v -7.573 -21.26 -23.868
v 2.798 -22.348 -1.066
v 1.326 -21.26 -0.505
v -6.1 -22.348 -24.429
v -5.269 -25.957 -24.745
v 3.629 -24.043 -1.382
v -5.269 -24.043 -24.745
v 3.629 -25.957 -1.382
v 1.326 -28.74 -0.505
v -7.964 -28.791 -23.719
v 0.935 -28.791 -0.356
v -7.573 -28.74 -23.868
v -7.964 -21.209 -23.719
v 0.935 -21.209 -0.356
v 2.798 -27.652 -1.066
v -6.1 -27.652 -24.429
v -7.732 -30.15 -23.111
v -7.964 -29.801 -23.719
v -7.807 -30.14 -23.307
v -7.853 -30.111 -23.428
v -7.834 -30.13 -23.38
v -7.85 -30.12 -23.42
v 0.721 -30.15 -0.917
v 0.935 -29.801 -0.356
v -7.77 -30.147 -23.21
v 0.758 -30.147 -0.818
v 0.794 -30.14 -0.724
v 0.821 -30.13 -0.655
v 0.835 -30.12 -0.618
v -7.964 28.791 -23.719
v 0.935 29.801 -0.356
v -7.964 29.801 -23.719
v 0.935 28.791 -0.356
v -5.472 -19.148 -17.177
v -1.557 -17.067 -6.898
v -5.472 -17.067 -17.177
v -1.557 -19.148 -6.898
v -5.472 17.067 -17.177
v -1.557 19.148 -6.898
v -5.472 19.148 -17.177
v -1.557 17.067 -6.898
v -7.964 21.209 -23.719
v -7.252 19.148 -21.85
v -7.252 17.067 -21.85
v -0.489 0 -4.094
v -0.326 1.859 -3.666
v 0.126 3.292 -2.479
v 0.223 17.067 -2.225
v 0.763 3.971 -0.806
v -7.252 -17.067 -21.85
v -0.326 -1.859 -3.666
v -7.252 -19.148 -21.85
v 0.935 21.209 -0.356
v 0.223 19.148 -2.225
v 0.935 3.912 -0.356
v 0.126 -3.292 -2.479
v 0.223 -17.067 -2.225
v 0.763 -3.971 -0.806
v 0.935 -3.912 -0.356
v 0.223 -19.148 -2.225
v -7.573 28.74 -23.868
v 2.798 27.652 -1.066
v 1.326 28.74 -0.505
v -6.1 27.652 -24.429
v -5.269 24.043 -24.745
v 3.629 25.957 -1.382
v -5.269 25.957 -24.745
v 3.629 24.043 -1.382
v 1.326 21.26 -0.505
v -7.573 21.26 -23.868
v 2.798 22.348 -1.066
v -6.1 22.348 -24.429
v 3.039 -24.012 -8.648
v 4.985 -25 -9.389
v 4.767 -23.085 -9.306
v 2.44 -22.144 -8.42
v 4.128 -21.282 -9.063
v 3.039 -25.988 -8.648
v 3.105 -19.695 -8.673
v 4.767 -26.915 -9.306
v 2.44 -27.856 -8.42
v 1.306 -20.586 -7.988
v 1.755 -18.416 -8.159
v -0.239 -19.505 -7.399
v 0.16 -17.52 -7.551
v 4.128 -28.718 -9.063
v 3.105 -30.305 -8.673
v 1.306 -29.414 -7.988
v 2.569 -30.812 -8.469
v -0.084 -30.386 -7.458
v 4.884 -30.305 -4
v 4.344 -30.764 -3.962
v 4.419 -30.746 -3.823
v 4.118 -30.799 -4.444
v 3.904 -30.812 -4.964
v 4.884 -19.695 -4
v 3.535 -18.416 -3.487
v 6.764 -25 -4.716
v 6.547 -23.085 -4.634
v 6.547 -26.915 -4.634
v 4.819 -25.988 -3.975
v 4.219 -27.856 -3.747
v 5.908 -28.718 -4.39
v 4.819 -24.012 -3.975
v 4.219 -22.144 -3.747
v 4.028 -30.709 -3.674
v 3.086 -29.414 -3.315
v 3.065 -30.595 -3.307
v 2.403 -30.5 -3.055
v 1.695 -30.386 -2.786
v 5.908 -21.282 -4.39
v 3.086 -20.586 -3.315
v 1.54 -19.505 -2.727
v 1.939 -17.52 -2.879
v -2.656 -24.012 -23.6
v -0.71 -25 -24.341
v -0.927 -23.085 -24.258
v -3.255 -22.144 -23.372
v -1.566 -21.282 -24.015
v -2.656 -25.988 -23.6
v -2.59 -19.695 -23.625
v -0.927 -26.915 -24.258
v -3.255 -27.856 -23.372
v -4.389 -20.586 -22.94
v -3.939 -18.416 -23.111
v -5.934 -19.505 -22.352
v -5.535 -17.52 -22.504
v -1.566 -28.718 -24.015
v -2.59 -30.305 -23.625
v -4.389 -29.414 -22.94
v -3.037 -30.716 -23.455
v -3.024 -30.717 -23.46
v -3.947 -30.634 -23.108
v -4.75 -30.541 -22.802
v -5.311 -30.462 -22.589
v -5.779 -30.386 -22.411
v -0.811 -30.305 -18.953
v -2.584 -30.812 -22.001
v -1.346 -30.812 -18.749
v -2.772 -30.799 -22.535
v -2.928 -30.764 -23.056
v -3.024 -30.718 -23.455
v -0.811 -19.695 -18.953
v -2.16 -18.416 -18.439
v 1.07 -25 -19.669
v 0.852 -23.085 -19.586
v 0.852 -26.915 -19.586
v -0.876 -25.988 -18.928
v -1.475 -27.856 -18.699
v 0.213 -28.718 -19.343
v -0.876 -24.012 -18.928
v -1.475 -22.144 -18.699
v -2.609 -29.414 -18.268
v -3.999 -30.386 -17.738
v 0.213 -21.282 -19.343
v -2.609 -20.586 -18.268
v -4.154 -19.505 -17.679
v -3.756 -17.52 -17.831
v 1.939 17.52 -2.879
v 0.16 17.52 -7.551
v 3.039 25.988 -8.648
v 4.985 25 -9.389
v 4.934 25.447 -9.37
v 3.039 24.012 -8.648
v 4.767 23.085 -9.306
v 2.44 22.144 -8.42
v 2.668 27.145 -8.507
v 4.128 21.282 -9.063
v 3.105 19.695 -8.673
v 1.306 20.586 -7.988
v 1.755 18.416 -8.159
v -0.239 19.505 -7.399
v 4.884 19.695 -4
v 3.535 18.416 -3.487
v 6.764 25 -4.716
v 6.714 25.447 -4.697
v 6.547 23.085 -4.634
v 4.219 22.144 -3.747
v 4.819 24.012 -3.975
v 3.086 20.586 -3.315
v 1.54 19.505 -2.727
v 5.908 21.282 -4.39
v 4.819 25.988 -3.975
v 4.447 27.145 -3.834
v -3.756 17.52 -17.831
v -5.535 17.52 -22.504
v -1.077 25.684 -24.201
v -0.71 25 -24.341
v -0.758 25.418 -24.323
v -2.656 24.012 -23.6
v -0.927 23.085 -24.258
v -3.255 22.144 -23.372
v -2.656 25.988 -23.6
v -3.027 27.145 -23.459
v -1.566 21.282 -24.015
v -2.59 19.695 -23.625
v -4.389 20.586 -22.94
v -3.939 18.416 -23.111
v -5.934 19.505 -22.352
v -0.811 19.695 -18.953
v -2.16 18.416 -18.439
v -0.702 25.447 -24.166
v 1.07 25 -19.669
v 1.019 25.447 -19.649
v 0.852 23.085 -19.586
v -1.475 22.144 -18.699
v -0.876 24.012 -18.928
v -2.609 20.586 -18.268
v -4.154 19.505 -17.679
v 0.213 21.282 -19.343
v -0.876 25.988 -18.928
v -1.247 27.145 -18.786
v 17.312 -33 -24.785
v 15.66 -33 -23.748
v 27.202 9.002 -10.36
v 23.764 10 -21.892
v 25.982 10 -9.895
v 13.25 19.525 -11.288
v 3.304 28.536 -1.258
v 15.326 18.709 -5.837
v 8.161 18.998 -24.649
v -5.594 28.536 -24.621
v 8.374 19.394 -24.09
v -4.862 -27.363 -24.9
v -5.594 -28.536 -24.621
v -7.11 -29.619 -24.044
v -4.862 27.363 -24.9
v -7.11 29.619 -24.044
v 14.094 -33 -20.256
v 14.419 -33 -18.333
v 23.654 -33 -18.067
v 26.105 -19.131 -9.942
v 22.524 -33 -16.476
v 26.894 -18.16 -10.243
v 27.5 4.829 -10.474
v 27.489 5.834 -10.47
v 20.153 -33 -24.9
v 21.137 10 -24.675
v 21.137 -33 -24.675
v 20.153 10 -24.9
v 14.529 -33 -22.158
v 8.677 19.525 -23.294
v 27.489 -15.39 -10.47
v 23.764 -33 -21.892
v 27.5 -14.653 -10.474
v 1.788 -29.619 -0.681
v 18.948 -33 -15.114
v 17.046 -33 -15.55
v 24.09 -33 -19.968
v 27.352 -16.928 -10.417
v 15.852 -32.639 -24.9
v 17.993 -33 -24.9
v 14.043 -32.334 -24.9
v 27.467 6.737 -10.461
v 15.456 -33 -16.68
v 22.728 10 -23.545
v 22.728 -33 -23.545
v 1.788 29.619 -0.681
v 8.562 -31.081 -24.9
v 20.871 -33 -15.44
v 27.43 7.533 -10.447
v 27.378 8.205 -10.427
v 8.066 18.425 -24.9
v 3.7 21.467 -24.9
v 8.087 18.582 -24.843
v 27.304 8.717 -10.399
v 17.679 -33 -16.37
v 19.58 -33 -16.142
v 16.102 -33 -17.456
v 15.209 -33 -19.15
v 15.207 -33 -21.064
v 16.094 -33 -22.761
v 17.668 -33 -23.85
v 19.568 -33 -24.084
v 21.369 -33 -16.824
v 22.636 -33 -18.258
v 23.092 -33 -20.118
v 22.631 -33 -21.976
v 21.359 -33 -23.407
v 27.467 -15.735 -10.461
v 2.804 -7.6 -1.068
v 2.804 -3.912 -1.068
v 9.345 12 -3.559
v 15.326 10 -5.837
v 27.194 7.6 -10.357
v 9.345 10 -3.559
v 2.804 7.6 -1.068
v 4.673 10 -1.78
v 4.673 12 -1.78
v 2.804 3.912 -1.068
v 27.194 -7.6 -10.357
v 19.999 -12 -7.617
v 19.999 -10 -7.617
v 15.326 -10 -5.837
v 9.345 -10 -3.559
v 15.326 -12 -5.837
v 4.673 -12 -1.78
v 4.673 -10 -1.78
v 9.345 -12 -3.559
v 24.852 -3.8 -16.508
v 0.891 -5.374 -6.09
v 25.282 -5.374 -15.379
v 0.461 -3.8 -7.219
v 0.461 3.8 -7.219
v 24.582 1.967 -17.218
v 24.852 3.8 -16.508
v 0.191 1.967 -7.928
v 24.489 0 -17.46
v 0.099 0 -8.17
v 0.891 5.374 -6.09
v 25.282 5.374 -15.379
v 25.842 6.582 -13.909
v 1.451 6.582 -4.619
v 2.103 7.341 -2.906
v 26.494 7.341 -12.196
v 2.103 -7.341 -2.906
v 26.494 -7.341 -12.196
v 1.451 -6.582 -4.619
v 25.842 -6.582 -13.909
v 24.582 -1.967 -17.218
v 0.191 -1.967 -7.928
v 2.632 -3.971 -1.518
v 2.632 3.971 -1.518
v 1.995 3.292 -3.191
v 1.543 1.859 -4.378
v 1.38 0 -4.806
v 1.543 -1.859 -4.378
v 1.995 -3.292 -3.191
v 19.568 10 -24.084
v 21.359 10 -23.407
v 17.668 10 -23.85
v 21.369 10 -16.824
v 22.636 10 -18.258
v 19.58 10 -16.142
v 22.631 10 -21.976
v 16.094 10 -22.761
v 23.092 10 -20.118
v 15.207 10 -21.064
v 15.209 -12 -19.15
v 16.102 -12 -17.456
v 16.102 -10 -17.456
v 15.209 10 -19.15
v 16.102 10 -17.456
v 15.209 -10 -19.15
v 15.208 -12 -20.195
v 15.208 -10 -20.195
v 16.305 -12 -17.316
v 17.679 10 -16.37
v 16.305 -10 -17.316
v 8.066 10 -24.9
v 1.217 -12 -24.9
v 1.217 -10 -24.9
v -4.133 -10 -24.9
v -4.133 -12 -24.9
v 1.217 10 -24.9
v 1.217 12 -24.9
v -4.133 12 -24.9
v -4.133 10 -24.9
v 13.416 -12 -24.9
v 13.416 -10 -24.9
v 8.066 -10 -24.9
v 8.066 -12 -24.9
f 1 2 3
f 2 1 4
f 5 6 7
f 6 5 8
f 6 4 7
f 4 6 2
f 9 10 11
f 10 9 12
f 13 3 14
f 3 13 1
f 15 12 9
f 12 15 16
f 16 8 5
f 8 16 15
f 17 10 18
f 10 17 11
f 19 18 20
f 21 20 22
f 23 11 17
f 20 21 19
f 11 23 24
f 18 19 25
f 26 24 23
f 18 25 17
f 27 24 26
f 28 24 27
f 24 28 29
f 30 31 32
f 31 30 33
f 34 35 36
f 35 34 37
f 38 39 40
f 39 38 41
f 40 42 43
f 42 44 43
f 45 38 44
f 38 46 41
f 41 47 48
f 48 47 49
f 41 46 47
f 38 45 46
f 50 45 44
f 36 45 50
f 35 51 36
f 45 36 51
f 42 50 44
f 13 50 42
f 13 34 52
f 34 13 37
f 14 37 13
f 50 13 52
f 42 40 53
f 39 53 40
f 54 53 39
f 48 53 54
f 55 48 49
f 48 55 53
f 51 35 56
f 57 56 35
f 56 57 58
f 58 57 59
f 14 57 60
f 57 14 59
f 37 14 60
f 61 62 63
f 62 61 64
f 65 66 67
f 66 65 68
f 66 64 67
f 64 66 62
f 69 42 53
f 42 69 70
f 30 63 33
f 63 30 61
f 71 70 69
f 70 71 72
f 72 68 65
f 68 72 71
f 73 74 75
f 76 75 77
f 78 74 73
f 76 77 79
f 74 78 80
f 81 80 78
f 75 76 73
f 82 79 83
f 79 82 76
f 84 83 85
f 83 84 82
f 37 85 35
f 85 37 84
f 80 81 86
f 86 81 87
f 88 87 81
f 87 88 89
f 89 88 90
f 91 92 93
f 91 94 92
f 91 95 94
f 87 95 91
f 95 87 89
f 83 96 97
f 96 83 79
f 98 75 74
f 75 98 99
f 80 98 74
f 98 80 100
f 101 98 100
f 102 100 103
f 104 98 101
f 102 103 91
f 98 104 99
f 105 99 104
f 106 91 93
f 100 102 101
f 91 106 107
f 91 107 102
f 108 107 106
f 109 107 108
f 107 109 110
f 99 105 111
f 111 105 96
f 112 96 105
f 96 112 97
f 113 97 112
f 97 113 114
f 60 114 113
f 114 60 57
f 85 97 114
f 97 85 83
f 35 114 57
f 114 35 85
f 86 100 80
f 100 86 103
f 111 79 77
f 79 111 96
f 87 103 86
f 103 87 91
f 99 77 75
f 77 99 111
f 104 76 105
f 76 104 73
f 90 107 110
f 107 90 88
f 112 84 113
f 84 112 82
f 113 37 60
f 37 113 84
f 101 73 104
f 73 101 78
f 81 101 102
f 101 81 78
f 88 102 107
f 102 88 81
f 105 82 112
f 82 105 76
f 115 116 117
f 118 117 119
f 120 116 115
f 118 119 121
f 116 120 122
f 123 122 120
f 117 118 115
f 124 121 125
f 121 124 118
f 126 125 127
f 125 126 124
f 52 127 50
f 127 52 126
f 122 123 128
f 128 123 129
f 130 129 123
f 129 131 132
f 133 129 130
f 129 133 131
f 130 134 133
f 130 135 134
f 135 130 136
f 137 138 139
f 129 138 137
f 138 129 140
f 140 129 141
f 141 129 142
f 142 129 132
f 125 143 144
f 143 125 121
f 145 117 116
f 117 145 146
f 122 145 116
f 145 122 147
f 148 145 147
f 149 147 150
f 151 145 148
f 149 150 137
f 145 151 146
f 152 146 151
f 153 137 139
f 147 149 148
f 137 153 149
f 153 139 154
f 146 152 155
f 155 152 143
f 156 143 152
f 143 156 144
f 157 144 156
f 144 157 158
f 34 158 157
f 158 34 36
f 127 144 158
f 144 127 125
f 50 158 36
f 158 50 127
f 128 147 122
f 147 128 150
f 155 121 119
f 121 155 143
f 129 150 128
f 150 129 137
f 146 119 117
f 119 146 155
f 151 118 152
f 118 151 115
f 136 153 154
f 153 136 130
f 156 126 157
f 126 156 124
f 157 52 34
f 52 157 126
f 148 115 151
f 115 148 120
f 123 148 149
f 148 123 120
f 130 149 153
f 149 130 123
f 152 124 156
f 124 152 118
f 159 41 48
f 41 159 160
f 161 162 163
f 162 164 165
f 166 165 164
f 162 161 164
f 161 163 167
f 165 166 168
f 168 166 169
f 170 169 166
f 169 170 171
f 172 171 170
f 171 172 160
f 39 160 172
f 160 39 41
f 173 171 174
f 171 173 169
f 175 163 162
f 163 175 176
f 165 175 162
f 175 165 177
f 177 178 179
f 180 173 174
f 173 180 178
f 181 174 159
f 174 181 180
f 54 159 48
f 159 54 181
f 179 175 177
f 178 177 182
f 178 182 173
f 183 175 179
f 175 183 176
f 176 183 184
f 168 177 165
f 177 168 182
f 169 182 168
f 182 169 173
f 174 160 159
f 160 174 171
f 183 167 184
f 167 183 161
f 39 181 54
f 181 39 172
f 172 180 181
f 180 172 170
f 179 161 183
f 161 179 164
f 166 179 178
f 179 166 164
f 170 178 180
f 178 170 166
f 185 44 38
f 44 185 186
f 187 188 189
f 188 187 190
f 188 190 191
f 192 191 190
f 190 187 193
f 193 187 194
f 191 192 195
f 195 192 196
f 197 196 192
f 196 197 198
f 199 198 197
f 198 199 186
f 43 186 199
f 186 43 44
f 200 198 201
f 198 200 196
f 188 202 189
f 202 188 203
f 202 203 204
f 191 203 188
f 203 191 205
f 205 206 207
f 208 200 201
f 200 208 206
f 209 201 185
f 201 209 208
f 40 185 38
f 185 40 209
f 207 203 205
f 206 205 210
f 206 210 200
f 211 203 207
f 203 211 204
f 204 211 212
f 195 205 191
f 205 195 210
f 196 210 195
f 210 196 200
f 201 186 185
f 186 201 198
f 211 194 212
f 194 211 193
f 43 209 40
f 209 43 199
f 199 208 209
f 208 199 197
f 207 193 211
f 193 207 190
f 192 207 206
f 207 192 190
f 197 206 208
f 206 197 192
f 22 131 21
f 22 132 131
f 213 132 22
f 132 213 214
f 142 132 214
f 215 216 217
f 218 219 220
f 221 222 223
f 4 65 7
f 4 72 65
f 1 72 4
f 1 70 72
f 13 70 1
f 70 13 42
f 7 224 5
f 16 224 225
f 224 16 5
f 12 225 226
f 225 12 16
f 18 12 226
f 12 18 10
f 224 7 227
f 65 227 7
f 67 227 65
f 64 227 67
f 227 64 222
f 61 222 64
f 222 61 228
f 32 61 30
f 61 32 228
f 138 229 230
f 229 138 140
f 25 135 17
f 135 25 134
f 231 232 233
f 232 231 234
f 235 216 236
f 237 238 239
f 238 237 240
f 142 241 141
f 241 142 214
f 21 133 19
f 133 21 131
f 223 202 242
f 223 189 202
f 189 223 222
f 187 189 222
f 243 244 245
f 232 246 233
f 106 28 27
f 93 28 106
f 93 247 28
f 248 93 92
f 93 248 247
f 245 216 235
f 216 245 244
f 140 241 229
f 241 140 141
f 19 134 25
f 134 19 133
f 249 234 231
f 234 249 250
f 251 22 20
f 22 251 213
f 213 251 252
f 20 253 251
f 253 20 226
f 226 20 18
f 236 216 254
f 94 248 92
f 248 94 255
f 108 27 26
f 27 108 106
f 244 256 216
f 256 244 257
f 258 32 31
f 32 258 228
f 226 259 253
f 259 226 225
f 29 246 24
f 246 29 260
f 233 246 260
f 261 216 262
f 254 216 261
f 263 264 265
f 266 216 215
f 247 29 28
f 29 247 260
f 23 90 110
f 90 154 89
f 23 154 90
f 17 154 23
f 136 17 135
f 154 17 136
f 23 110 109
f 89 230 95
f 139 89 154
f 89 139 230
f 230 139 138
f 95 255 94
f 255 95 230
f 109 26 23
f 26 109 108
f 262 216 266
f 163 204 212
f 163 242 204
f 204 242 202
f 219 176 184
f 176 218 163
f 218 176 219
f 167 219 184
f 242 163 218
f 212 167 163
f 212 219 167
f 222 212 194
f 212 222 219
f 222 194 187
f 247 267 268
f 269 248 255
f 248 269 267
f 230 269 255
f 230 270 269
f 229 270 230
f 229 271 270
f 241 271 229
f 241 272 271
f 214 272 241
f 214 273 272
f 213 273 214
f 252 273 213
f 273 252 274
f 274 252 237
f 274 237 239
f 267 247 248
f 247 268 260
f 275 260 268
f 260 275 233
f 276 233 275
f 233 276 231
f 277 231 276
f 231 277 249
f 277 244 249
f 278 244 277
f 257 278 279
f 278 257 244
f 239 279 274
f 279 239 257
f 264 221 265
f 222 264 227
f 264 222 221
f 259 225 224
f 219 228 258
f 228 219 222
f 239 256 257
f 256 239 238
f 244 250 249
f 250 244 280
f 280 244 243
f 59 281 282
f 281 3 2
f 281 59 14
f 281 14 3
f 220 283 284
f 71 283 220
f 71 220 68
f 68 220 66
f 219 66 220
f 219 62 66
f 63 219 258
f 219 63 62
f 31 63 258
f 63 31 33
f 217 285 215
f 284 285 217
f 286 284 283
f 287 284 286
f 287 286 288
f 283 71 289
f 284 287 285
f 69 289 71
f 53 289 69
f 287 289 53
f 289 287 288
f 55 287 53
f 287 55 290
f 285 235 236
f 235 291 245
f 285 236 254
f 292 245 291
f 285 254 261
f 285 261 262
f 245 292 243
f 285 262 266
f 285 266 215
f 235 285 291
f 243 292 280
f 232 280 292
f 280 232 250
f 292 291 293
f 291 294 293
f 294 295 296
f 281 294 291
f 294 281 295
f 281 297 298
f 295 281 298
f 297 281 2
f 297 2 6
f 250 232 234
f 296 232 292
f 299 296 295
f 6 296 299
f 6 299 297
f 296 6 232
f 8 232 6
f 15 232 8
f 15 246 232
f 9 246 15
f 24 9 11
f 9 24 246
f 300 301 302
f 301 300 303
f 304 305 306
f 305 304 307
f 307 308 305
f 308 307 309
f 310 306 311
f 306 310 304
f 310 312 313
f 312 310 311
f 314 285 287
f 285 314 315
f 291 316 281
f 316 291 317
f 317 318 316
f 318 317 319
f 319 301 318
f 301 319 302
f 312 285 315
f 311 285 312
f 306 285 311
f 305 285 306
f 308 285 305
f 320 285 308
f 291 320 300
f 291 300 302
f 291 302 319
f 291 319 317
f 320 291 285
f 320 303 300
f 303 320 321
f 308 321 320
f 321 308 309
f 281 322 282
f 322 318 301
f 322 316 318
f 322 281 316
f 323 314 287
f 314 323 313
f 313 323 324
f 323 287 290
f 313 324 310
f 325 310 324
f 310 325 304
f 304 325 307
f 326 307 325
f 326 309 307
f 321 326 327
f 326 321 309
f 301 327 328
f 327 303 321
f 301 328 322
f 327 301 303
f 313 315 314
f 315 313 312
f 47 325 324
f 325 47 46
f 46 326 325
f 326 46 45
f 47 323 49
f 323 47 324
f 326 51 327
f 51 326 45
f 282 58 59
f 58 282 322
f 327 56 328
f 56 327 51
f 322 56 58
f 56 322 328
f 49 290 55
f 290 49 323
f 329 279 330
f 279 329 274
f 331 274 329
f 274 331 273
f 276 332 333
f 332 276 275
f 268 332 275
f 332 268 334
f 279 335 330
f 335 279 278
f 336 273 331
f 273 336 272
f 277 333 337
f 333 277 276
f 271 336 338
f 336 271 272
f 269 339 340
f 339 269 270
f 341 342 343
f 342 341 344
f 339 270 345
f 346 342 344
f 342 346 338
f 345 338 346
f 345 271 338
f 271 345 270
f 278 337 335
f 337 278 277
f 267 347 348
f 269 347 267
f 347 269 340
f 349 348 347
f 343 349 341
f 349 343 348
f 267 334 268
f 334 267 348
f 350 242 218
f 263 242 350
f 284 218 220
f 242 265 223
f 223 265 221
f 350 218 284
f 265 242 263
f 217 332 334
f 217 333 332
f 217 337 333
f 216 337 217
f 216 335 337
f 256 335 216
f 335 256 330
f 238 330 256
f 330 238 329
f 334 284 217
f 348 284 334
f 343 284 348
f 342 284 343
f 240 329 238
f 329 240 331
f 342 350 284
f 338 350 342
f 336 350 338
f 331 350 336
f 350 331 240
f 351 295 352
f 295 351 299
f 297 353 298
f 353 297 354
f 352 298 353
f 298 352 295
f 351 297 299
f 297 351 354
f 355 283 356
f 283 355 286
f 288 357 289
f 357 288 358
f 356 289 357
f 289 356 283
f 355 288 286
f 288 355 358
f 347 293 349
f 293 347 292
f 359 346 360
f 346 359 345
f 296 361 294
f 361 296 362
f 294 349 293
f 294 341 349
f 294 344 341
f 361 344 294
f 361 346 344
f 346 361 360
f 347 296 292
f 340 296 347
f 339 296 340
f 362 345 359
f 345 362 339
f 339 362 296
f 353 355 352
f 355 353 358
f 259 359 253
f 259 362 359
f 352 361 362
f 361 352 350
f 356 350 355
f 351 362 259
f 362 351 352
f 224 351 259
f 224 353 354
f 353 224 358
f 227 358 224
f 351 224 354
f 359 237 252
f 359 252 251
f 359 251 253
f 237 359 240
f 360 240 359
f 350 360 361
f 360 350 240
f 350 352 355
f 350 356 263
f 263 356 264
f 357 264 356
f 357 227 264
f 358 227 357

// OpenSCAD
m8 = 7.80 / 2;
m3 = 2.8 /2;
m3_nut = 6.1 /2;

prusa_belt_height = 11.5;
prusa_belt_offset = 17.5;

t5_thickness = 2.5;
t5_width = 5;

t5_16=14;

608bearing = 22/2;
608bearing_width = 7;

m8washer = 15.8/2;
m8washer_width=1.5;


xrodgap = 50;	
zrodgap=30;

	rod = m8;
	thickness = 1.1;
	belt_width=t5_width;
	belt_thickness=t5_thickness;
	belt_height = prusa_belt_height;
	belt_offset = prusa_belt_offset;
	pully = t5_16;
	pully_length=20;
	bearing = 608bearing;
	bearing_width = 608bearing_width;
	washer = m8washer;
	washer_width = m8washer_width;

		//Placeholders

		%for(r=[0:1]) {
			//Z-Rods
			translate([
				zrodgap*r,
				0,
				-50
			]) {
				cylinder(
					r=rod,
					h=100
				);
			}

			//X-Rods
			translate([
				0,
				-xrodgap/2+xrodgap*r,
				0
			]) {
				rotate([
					0,
					90,
					0,
				]) {
					cylinder(
						r = rod,
						h =100
					);
				}
			}

		}

difference(){

rotate([0,110.85,0])
difference() {
hull() {
translate([12,10, 25]) rotate([90,0,0])  cylinder(r=10/2, h=43);


for(x=[0:1]) {
translate([
	0,
	-25+50*x,
	0
])
	rotate([
		0,
		90,
		0
	]) {

			cylinder(
				r = 10/2,
				h = 25
			);
		
	}
}


	translate([
		0,
		0,
		1
	]) 
		cylinder(
			r=18/2,
			h=28
		);
}

	translate([
		-100,
		-60,
		1-.1
	]) cube(100);
	
	translate([
		0,
		0,
		3
	]) {
		cylinder(
			r=7.6,
			h=26+.1
		);
	}
translate([0,0,-.1]) cylinder(r=8/2, h=4);
for(x=[0:1]) {
translate([
	0,
	-25+50*x,
	0
])
	rotate([
		0,
		90,
		0
	]) {
			translate([0,0,-.1]) cylinder(
				r = 8/2,
				h = 26
			);
			translate([-1,-15,-20]) cube(100);
		}
	}

translate([12,20, 25]) rotate([90,0,0])  cylinder(r=8/2, h=63);
translate([-.1,10,16.4])
cube(50);

translate([-.1,-12,5]) cube([100,2,5]);
translate([-.1,10,5]) cube([100,2,5]);
translate([-.1,-12,16.4]) cube([100,2,5]);
translate([-.1,10,16.4]) cube([100,2,5]);

translate([2, -25, 0])
rotate([0,90,0]) 
difference() {
	cylinder(
		r=8,
		h=5
	);
	translate([0,0,-.1]) cylinder(
		r=6,
		h=5.2
	);
}


translate([18, -25, 0])
rotate([0,90,0]) 
difference() {
	cylinder(
		r=8,
		h=5
	);
	translate([0,0,-.1]) cylinder(
		r=6,
		h=5.2
	);
}

translate([2, 25, 0])
rotate([0,90,0]) 
difference() {
	cylinder(
		r=8,
		h=5
	);
	translate([0,0,-.1]) cylinder(
		r=6,
		h=5.2
	);
}


translate([18, 25, 0])
rotate([0,90,0]) 
difference() {
	cylinder(
		r=8,
		h=5
	);
	translate([0,0,-.1]) cylinder(
		r=6,
		h=5.2
	);
}

}

rotate([0,0,90])
		translate([-25-15.8/2+5/2+1, -6, 28-3-4.7+12.5-8]) rotate([0,90,0]) 
		%cylinder(h=5+2,r=8/2,$fn=9,center=true);


translate([-500,-500,-1024.9]) cube(1000);}
